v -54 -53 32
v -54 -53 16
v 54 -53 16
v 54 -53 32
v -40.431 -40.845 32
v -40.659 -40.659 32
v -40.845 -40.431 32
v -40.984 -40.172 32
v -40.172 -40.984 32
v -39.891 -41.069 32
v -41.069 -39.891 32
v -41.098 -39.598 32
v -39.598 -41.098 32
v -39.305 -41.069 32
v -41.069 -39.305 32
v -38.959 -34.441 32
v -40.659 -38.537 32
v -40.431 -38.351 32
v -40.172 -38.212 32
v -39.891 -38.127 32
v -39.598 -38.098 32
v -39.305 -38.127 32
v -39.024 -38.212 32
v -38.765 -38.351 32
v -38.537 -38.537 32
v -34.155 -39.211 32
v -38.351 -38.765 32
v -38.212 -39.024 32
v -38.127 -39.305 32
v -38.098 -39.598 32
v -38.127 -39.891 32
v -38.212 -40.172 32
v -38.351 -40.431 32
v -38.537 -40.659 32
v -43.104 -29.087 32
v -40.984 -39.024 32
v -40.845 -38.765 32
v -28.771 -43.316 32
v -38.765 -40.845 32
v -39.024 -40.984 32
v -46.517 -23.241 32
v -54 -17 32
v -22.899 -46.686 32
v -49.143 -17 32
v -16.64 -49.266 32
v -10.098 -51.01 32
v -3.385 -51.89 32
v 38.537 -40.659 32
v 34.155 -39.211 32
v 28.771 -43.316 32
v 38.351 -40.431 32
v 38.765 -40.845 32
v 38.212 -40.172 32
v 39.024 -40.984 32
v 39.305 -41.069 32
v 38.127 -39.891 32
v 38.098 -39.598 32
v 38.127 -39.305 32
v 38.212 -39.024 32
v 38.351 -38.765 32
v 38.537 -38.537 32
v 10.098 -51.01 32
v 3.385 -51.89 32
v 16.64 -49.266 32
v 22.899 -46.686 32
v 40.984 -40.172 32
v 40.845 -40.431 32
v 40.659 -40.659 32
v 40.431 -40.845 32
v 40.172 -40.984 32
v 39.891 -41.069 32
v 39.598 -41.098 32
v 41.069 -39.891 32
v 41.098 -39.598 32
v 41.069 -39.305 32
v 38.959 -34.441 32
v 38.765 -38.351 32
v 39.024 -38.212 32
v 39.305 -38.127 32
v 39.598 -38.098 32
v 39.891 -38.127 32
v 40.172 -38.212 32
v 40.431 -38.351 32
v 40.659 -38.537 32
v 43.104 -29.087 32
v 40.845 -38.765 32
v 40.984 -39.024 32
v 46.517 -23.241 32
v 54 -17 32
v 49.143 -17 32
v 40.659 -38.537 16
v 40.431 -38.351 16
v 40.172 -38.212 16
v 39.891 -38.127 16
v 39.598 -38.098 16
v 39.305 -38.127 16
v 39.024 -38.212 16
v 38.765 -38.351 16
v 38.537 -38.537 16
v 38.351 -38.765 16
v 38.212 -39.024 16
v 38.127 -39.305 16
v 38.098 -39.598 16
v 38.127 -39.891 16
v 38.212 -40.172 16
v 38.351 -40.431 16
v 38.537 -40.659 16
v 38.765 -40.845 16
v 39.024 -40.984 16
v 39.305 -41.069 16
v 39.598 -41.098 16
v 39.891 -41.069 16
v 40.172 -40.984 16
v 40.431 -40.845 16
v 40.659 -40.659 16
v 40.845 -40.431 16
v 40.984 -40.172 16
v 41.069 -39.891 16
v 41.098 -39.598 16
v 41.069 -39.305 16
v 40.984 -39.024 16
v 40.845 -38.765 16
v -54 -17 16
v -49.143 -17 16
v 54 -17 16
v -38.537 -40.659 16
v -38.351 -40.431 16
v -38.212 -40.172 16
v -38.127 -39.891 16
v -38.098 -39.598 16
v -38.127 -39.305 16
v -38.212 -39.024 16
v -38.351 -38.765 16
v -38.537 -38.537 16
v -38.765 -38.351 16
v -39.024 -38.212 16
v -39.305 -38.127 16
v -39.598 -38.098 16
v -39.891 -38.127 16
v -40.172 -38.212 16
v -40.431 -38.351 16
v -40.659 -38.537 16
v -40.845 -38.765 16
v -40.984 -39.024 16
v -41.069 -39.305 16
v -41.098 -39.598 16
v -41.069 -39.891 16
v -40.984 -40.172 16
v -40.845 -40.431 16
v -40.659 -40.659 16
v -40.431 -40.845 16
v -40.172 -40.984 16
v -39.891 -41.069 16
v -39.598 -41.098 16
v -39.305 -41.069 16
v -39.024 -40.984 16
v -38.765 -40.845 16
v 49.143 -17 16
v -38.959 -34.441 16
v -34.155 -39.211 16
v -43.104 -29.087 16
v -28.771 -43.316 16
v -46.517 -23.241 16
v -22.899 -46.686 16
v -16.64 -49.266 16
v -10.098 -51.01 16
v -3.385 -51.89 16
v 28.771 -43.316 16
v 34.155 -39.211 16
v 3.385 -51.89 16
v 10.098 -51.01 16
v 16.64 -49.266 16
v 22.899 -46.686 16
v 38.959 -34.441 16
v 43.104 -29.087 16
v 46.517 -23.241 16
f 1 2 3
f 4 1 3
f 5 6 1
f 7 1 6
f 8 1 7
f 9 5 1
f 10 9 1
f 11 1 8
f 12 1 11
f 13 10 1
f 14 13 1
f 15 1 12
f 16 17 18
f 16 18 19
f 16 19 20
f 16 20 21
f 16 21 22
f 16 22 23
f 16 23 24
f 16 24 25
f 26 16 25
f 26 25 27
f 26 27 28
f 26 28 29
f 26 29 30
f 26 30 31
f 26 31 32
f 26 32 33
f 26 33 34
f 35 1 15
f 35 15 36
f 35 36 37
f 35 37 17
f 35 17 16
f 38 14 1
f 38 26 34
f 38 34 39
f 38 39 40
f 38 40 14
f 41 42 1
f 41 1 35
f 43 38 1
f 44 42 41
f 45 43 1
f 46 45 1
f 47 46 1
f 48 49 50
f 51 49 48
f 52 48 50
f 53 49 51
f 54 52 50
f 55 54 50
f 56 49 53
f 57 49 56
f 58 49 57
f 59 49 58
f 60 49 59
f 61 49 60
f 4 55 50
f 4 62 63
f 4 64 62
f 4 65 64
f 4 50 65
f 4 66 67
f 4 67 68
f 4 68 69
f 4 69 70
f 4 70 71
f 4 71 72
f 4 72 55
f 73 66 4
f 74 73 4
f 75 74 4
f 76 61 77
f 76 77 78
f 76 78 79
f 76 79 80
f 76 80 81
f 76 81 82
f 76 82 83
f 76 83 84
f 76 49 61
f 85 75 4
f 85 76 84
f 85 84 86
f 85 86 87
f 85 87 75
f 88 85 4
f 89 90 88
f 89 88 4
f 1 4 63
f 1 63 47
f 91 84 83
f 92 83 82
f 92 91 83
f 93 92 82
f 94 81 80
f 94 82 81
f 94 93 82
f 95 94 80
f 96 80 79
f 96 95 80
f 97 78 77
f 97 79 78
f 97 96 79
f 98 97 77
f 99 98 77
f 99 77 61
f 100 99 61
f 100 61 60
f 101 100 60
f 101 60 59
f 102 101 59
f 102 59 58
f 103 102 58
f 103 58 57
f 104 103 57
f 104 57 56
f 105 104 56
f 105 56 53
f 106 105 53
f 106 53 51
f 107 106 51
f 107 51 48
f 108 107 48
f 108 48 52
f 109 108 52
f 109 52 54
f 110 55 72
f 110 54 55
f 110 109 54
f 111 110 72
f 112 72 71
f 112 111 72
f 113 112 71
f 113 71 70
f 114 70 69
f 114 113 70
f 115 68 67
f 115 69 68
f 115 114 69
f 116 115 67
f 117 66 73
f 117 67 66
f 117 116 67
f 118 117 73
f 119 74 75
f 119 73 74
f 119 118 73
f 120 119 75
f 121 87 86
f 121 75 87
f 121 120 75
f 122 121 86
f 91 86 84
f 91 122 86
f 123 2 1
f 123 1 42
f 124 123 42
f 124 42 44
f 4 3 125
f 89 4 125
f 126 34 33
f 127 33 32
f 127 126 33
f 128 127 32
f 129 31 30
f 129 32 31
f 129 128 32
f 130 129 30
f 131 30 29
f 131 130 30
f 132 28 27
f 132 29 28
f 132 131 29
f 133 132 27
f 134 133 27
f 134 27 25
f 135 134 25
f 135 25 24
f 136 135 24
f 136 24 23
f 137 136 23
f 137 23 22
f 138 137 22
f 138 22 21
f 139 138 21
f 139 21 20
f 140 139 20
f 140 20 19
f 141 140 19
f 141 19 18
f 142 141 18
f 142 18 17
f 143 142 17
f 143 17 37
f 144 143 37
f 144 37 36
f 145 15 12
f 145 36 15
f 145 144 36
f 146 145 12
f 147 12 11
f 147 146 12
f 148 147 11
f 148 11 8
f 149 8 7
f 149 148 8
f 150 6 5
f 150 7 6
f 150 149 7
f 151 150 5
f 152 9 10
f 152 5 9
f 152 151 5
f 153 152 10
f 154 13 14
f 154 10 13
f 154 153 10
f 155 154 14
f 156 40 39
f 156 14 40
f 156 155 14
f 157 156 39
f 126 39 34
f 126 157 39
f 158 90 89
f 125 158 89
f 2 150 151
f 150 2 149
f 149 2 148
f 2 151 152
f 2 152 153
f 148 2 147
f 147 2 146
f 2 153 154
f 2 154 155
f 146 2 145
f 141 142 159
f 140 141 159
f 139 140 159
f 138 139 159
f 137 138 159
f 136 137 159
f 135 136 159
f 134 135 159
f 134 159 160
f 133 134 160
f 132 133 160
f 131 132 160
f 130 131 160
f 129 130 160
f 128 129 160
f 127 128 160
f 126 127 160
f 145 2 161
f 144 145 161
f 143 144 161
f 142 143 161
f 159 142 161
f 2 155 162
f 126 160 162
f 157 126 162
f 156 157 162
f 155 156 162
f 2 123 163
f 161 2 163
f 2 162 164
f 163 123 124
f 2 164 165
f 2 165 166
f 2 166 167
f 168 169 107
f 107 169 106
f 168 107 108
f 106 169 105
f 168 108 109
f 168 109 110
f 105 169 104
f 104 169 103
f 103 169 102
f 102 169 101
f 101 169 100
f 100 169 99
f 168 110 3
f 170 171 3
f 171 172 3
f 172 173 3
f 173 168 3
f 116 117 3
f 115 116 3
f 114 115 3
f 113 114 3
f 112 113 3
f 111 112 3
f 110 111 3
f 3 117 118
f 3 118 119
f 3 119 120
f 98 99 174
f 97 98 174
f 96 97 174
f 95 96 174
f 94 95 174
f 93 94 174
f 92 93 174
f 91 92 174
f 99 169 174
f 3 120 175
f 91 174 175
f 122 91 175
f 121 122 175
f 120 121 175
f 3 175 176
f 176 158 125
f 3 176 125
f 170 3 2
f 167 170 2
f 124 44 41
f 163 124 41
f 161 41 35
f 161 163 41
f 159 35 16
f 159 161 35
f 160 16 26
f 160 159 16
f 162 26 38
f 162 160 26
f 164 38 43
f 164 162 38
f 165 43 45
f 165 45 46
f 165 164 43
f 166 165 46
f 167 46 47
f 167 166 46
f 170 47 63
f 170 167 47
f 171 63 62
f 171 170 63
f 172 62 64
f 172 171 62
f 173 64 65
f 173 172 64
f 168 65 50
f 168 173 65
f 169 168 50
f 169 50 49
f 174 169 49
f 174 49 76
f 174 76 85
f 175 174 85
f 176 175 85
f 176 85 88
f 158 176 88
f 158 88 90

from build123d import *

# Parameters (mm, degrees)
CYLINDER1016_R               = 1.5
CYLINDER1016_DEPTH           = 50
CYLINDER1016_PLACEMENT_ANGLE = 45
CYLINDER1012_R               = 1.5
CYLINDER1012_DEPTH           = 50
CYLINDER1012_PLACEMENT_ANGLE = 135
CYLINDER1014_R               = 1.5
CYLINDER1014_DEPTH           = 50
CYLINDER1017_R               = 1.5
CYLINDER1017_DEPTH           = 50
CYLINDER1017_PLACEMENT_ANGLE = 225
CYLINDER1018_R               = 1.5
CYLINDER1018_DEPTH           = 50
CYLINDER1013_R               = 1.5
CYLINDER1013_DEPTH           = 50
CYLINDER1013_PLACEMENT_ANGLE = 45
CYLINDER1015_R               = 1.5
CYLINDER1015_DEPTH           = 50
CYLINDER1011_R               = 52
CYLINDER1011_DEPTH           = 16
BOX416_W                     = 108
BOX416_H                     = 36
BOX416_DEPTH                 = 16


with BuildPart() as v_lec1016:
    # Cylinder1016 → Cylinder1016 (new body)
    with BuildSketch(Plane.XY):
        Circle(CYLINDER1016_R)
    extrude(amount=CYLINDER1016_DEPTH)


with BuildPart() as v_lec1016_1:
    # Cylinder1016 placement: moved
    add(v_lec1016.part.moved(Location((39.59798, -39.59798, 2))).rotate(Axis((39.59798, -39.59798, 2), (0, 0, 1)), CYLINDER1016_PLACEMENT_ANGLE))


with BuildPart() as v_lec1012:
    # Cylinder1012 → Cylinder1012 (new body)
    with BuildSketch(Plane.XY):
        Circle(CYLINDER1012_R)
    extrude(amount=CYLINDER1012_DEPTH)


with BuildPart() as v_lec1012_1:
    # Cylinder1012 placement: moved
    add(v_lec1012.part.moved(Location((39.59798, 39.59798, 2))).rotate(Axis((39.59798, 39.59798, 2), (0, 0, 1)), CYLINDER1012_PLACEMENT_ANGLE))


with BuildPart() as v_lec1014:
    # Cylinder1014 → Cylinder1014 (new body)
    with BuildSketch(Plane(origin=(0, 56, 2), x_dir=(-1, 0, 0), z_dir=(0, 0, 1))):
        Circle(CYLINDER1014_R)
    extrude(amount=CYLINDER1014_DEPTH)


with BuildPart() as v_lec1017:
    # Cylinder1017 → Cylinder1017 (new body)
    with BuildSketch(Plane.XY):
        Circle(CYLINDER1017_R)
    extrude(amount=CYLINDER1017_DEPTH)


with BuildPart() as v_lec1017_1:
    # Cylinder1017 placement: moved
    add(v_lec1017.part.moved(Location((-39.59798, 39.59798, 2))).rotate(Axis((-39.59798, 39.59798, 2), (0, 0, 1)), CYLINDER1017_PLACEMENT_ANGLE))


with BuildPart() as v_lec1018:
    # Cylinder1018 → Cylinder1018 (new body)
    with BuildSketch(Plane(origin=(-56, 0, 2), x_dir=(0, -1, 0), z_dir=(0, 0, 1))):
        Circle(CYLINDER1018_R)
    extrude(amount=CYLINDER1018_DEPTH)


with BuildPart() as v_lec1013:
    # Cylinder1013 → Cylinder1013 (new body)
    with BuildSketch(Plane.XY):
        Circle(CYLINDER1013_R)
    extrude(amount=CYLINDER1013_DEPTH)


with BuildPart() as v_lec1013_1:
    # Cylinder1013 placement: moved
    add(v_lec1013.part.moved(Location((-39.59798, -39.59798, 2))).rotate(Axis((-39.59798, -39.59798, 2), (0, 0, -1)), CYLINDER1013_PLACEMENT_ANGLE))


with BuildPart() as compound817:
    # Cylinder1015 → Cylinder1015 (new body)
    with BuildSketch(Plane(origin=(0, -56, 2), x_dir=(1, 0, 0), z_dir=(0, 0, 1))):
        Circle(CYLINDER1015_R)
    extrude(amount=CYLINDER1015_DEPTH)

    # Compound817: union Válec1016, Válec1012, Válec1014, Válec1017, Válec1018, Válec1013
    add(v_lec1016_1.part)
    add(v_lec1012_1.part)
    add(v_lec1014.part)
    add(v_lec1017_1.part)
    add(v_lec1018.part)
    add(v_lec1013_1.part)


with BuildPart() as v_lec1011:
    # Cylinder1011 → Cylinder1011 (new body)
    with BuildSketch(Plane.XY.offset(20)):
        Circle(CYLINDER1011_R)
    extrude(amount=CYLINDER1011_DEPTH)


with BuildPart() as cut423:
    # Box416 → Box416 (new body)
    with BuildSketch(Plane(origin=(-54, -53, 20), x_dir=(1, 0, 0), z_dir=(0, 0, 1))):
        with Locations((54, 18)):
            Rectangle(BOX416_W, BOX416_H)
    extrude(amount=BOX416_DEPTH)

    # Cut424: cut Válec1011
    add(v_lec1011.part, mode=Mode.SUBTRACT)


with BuildPart() as cut423_1:
    # Cut424 placement: moved
    add(cut423.part.moved(Location((0, 0, -10))))

    # Cut423: cut Compound817
    add(compound817.part, mode=Mode.SUBTRACT)


with BuildPart() as cut423_2:
    # Cut423 placement: moved
    add(cut423_1.part.moved(Location((0, 0, 6))))


solid = cut423_2.part
